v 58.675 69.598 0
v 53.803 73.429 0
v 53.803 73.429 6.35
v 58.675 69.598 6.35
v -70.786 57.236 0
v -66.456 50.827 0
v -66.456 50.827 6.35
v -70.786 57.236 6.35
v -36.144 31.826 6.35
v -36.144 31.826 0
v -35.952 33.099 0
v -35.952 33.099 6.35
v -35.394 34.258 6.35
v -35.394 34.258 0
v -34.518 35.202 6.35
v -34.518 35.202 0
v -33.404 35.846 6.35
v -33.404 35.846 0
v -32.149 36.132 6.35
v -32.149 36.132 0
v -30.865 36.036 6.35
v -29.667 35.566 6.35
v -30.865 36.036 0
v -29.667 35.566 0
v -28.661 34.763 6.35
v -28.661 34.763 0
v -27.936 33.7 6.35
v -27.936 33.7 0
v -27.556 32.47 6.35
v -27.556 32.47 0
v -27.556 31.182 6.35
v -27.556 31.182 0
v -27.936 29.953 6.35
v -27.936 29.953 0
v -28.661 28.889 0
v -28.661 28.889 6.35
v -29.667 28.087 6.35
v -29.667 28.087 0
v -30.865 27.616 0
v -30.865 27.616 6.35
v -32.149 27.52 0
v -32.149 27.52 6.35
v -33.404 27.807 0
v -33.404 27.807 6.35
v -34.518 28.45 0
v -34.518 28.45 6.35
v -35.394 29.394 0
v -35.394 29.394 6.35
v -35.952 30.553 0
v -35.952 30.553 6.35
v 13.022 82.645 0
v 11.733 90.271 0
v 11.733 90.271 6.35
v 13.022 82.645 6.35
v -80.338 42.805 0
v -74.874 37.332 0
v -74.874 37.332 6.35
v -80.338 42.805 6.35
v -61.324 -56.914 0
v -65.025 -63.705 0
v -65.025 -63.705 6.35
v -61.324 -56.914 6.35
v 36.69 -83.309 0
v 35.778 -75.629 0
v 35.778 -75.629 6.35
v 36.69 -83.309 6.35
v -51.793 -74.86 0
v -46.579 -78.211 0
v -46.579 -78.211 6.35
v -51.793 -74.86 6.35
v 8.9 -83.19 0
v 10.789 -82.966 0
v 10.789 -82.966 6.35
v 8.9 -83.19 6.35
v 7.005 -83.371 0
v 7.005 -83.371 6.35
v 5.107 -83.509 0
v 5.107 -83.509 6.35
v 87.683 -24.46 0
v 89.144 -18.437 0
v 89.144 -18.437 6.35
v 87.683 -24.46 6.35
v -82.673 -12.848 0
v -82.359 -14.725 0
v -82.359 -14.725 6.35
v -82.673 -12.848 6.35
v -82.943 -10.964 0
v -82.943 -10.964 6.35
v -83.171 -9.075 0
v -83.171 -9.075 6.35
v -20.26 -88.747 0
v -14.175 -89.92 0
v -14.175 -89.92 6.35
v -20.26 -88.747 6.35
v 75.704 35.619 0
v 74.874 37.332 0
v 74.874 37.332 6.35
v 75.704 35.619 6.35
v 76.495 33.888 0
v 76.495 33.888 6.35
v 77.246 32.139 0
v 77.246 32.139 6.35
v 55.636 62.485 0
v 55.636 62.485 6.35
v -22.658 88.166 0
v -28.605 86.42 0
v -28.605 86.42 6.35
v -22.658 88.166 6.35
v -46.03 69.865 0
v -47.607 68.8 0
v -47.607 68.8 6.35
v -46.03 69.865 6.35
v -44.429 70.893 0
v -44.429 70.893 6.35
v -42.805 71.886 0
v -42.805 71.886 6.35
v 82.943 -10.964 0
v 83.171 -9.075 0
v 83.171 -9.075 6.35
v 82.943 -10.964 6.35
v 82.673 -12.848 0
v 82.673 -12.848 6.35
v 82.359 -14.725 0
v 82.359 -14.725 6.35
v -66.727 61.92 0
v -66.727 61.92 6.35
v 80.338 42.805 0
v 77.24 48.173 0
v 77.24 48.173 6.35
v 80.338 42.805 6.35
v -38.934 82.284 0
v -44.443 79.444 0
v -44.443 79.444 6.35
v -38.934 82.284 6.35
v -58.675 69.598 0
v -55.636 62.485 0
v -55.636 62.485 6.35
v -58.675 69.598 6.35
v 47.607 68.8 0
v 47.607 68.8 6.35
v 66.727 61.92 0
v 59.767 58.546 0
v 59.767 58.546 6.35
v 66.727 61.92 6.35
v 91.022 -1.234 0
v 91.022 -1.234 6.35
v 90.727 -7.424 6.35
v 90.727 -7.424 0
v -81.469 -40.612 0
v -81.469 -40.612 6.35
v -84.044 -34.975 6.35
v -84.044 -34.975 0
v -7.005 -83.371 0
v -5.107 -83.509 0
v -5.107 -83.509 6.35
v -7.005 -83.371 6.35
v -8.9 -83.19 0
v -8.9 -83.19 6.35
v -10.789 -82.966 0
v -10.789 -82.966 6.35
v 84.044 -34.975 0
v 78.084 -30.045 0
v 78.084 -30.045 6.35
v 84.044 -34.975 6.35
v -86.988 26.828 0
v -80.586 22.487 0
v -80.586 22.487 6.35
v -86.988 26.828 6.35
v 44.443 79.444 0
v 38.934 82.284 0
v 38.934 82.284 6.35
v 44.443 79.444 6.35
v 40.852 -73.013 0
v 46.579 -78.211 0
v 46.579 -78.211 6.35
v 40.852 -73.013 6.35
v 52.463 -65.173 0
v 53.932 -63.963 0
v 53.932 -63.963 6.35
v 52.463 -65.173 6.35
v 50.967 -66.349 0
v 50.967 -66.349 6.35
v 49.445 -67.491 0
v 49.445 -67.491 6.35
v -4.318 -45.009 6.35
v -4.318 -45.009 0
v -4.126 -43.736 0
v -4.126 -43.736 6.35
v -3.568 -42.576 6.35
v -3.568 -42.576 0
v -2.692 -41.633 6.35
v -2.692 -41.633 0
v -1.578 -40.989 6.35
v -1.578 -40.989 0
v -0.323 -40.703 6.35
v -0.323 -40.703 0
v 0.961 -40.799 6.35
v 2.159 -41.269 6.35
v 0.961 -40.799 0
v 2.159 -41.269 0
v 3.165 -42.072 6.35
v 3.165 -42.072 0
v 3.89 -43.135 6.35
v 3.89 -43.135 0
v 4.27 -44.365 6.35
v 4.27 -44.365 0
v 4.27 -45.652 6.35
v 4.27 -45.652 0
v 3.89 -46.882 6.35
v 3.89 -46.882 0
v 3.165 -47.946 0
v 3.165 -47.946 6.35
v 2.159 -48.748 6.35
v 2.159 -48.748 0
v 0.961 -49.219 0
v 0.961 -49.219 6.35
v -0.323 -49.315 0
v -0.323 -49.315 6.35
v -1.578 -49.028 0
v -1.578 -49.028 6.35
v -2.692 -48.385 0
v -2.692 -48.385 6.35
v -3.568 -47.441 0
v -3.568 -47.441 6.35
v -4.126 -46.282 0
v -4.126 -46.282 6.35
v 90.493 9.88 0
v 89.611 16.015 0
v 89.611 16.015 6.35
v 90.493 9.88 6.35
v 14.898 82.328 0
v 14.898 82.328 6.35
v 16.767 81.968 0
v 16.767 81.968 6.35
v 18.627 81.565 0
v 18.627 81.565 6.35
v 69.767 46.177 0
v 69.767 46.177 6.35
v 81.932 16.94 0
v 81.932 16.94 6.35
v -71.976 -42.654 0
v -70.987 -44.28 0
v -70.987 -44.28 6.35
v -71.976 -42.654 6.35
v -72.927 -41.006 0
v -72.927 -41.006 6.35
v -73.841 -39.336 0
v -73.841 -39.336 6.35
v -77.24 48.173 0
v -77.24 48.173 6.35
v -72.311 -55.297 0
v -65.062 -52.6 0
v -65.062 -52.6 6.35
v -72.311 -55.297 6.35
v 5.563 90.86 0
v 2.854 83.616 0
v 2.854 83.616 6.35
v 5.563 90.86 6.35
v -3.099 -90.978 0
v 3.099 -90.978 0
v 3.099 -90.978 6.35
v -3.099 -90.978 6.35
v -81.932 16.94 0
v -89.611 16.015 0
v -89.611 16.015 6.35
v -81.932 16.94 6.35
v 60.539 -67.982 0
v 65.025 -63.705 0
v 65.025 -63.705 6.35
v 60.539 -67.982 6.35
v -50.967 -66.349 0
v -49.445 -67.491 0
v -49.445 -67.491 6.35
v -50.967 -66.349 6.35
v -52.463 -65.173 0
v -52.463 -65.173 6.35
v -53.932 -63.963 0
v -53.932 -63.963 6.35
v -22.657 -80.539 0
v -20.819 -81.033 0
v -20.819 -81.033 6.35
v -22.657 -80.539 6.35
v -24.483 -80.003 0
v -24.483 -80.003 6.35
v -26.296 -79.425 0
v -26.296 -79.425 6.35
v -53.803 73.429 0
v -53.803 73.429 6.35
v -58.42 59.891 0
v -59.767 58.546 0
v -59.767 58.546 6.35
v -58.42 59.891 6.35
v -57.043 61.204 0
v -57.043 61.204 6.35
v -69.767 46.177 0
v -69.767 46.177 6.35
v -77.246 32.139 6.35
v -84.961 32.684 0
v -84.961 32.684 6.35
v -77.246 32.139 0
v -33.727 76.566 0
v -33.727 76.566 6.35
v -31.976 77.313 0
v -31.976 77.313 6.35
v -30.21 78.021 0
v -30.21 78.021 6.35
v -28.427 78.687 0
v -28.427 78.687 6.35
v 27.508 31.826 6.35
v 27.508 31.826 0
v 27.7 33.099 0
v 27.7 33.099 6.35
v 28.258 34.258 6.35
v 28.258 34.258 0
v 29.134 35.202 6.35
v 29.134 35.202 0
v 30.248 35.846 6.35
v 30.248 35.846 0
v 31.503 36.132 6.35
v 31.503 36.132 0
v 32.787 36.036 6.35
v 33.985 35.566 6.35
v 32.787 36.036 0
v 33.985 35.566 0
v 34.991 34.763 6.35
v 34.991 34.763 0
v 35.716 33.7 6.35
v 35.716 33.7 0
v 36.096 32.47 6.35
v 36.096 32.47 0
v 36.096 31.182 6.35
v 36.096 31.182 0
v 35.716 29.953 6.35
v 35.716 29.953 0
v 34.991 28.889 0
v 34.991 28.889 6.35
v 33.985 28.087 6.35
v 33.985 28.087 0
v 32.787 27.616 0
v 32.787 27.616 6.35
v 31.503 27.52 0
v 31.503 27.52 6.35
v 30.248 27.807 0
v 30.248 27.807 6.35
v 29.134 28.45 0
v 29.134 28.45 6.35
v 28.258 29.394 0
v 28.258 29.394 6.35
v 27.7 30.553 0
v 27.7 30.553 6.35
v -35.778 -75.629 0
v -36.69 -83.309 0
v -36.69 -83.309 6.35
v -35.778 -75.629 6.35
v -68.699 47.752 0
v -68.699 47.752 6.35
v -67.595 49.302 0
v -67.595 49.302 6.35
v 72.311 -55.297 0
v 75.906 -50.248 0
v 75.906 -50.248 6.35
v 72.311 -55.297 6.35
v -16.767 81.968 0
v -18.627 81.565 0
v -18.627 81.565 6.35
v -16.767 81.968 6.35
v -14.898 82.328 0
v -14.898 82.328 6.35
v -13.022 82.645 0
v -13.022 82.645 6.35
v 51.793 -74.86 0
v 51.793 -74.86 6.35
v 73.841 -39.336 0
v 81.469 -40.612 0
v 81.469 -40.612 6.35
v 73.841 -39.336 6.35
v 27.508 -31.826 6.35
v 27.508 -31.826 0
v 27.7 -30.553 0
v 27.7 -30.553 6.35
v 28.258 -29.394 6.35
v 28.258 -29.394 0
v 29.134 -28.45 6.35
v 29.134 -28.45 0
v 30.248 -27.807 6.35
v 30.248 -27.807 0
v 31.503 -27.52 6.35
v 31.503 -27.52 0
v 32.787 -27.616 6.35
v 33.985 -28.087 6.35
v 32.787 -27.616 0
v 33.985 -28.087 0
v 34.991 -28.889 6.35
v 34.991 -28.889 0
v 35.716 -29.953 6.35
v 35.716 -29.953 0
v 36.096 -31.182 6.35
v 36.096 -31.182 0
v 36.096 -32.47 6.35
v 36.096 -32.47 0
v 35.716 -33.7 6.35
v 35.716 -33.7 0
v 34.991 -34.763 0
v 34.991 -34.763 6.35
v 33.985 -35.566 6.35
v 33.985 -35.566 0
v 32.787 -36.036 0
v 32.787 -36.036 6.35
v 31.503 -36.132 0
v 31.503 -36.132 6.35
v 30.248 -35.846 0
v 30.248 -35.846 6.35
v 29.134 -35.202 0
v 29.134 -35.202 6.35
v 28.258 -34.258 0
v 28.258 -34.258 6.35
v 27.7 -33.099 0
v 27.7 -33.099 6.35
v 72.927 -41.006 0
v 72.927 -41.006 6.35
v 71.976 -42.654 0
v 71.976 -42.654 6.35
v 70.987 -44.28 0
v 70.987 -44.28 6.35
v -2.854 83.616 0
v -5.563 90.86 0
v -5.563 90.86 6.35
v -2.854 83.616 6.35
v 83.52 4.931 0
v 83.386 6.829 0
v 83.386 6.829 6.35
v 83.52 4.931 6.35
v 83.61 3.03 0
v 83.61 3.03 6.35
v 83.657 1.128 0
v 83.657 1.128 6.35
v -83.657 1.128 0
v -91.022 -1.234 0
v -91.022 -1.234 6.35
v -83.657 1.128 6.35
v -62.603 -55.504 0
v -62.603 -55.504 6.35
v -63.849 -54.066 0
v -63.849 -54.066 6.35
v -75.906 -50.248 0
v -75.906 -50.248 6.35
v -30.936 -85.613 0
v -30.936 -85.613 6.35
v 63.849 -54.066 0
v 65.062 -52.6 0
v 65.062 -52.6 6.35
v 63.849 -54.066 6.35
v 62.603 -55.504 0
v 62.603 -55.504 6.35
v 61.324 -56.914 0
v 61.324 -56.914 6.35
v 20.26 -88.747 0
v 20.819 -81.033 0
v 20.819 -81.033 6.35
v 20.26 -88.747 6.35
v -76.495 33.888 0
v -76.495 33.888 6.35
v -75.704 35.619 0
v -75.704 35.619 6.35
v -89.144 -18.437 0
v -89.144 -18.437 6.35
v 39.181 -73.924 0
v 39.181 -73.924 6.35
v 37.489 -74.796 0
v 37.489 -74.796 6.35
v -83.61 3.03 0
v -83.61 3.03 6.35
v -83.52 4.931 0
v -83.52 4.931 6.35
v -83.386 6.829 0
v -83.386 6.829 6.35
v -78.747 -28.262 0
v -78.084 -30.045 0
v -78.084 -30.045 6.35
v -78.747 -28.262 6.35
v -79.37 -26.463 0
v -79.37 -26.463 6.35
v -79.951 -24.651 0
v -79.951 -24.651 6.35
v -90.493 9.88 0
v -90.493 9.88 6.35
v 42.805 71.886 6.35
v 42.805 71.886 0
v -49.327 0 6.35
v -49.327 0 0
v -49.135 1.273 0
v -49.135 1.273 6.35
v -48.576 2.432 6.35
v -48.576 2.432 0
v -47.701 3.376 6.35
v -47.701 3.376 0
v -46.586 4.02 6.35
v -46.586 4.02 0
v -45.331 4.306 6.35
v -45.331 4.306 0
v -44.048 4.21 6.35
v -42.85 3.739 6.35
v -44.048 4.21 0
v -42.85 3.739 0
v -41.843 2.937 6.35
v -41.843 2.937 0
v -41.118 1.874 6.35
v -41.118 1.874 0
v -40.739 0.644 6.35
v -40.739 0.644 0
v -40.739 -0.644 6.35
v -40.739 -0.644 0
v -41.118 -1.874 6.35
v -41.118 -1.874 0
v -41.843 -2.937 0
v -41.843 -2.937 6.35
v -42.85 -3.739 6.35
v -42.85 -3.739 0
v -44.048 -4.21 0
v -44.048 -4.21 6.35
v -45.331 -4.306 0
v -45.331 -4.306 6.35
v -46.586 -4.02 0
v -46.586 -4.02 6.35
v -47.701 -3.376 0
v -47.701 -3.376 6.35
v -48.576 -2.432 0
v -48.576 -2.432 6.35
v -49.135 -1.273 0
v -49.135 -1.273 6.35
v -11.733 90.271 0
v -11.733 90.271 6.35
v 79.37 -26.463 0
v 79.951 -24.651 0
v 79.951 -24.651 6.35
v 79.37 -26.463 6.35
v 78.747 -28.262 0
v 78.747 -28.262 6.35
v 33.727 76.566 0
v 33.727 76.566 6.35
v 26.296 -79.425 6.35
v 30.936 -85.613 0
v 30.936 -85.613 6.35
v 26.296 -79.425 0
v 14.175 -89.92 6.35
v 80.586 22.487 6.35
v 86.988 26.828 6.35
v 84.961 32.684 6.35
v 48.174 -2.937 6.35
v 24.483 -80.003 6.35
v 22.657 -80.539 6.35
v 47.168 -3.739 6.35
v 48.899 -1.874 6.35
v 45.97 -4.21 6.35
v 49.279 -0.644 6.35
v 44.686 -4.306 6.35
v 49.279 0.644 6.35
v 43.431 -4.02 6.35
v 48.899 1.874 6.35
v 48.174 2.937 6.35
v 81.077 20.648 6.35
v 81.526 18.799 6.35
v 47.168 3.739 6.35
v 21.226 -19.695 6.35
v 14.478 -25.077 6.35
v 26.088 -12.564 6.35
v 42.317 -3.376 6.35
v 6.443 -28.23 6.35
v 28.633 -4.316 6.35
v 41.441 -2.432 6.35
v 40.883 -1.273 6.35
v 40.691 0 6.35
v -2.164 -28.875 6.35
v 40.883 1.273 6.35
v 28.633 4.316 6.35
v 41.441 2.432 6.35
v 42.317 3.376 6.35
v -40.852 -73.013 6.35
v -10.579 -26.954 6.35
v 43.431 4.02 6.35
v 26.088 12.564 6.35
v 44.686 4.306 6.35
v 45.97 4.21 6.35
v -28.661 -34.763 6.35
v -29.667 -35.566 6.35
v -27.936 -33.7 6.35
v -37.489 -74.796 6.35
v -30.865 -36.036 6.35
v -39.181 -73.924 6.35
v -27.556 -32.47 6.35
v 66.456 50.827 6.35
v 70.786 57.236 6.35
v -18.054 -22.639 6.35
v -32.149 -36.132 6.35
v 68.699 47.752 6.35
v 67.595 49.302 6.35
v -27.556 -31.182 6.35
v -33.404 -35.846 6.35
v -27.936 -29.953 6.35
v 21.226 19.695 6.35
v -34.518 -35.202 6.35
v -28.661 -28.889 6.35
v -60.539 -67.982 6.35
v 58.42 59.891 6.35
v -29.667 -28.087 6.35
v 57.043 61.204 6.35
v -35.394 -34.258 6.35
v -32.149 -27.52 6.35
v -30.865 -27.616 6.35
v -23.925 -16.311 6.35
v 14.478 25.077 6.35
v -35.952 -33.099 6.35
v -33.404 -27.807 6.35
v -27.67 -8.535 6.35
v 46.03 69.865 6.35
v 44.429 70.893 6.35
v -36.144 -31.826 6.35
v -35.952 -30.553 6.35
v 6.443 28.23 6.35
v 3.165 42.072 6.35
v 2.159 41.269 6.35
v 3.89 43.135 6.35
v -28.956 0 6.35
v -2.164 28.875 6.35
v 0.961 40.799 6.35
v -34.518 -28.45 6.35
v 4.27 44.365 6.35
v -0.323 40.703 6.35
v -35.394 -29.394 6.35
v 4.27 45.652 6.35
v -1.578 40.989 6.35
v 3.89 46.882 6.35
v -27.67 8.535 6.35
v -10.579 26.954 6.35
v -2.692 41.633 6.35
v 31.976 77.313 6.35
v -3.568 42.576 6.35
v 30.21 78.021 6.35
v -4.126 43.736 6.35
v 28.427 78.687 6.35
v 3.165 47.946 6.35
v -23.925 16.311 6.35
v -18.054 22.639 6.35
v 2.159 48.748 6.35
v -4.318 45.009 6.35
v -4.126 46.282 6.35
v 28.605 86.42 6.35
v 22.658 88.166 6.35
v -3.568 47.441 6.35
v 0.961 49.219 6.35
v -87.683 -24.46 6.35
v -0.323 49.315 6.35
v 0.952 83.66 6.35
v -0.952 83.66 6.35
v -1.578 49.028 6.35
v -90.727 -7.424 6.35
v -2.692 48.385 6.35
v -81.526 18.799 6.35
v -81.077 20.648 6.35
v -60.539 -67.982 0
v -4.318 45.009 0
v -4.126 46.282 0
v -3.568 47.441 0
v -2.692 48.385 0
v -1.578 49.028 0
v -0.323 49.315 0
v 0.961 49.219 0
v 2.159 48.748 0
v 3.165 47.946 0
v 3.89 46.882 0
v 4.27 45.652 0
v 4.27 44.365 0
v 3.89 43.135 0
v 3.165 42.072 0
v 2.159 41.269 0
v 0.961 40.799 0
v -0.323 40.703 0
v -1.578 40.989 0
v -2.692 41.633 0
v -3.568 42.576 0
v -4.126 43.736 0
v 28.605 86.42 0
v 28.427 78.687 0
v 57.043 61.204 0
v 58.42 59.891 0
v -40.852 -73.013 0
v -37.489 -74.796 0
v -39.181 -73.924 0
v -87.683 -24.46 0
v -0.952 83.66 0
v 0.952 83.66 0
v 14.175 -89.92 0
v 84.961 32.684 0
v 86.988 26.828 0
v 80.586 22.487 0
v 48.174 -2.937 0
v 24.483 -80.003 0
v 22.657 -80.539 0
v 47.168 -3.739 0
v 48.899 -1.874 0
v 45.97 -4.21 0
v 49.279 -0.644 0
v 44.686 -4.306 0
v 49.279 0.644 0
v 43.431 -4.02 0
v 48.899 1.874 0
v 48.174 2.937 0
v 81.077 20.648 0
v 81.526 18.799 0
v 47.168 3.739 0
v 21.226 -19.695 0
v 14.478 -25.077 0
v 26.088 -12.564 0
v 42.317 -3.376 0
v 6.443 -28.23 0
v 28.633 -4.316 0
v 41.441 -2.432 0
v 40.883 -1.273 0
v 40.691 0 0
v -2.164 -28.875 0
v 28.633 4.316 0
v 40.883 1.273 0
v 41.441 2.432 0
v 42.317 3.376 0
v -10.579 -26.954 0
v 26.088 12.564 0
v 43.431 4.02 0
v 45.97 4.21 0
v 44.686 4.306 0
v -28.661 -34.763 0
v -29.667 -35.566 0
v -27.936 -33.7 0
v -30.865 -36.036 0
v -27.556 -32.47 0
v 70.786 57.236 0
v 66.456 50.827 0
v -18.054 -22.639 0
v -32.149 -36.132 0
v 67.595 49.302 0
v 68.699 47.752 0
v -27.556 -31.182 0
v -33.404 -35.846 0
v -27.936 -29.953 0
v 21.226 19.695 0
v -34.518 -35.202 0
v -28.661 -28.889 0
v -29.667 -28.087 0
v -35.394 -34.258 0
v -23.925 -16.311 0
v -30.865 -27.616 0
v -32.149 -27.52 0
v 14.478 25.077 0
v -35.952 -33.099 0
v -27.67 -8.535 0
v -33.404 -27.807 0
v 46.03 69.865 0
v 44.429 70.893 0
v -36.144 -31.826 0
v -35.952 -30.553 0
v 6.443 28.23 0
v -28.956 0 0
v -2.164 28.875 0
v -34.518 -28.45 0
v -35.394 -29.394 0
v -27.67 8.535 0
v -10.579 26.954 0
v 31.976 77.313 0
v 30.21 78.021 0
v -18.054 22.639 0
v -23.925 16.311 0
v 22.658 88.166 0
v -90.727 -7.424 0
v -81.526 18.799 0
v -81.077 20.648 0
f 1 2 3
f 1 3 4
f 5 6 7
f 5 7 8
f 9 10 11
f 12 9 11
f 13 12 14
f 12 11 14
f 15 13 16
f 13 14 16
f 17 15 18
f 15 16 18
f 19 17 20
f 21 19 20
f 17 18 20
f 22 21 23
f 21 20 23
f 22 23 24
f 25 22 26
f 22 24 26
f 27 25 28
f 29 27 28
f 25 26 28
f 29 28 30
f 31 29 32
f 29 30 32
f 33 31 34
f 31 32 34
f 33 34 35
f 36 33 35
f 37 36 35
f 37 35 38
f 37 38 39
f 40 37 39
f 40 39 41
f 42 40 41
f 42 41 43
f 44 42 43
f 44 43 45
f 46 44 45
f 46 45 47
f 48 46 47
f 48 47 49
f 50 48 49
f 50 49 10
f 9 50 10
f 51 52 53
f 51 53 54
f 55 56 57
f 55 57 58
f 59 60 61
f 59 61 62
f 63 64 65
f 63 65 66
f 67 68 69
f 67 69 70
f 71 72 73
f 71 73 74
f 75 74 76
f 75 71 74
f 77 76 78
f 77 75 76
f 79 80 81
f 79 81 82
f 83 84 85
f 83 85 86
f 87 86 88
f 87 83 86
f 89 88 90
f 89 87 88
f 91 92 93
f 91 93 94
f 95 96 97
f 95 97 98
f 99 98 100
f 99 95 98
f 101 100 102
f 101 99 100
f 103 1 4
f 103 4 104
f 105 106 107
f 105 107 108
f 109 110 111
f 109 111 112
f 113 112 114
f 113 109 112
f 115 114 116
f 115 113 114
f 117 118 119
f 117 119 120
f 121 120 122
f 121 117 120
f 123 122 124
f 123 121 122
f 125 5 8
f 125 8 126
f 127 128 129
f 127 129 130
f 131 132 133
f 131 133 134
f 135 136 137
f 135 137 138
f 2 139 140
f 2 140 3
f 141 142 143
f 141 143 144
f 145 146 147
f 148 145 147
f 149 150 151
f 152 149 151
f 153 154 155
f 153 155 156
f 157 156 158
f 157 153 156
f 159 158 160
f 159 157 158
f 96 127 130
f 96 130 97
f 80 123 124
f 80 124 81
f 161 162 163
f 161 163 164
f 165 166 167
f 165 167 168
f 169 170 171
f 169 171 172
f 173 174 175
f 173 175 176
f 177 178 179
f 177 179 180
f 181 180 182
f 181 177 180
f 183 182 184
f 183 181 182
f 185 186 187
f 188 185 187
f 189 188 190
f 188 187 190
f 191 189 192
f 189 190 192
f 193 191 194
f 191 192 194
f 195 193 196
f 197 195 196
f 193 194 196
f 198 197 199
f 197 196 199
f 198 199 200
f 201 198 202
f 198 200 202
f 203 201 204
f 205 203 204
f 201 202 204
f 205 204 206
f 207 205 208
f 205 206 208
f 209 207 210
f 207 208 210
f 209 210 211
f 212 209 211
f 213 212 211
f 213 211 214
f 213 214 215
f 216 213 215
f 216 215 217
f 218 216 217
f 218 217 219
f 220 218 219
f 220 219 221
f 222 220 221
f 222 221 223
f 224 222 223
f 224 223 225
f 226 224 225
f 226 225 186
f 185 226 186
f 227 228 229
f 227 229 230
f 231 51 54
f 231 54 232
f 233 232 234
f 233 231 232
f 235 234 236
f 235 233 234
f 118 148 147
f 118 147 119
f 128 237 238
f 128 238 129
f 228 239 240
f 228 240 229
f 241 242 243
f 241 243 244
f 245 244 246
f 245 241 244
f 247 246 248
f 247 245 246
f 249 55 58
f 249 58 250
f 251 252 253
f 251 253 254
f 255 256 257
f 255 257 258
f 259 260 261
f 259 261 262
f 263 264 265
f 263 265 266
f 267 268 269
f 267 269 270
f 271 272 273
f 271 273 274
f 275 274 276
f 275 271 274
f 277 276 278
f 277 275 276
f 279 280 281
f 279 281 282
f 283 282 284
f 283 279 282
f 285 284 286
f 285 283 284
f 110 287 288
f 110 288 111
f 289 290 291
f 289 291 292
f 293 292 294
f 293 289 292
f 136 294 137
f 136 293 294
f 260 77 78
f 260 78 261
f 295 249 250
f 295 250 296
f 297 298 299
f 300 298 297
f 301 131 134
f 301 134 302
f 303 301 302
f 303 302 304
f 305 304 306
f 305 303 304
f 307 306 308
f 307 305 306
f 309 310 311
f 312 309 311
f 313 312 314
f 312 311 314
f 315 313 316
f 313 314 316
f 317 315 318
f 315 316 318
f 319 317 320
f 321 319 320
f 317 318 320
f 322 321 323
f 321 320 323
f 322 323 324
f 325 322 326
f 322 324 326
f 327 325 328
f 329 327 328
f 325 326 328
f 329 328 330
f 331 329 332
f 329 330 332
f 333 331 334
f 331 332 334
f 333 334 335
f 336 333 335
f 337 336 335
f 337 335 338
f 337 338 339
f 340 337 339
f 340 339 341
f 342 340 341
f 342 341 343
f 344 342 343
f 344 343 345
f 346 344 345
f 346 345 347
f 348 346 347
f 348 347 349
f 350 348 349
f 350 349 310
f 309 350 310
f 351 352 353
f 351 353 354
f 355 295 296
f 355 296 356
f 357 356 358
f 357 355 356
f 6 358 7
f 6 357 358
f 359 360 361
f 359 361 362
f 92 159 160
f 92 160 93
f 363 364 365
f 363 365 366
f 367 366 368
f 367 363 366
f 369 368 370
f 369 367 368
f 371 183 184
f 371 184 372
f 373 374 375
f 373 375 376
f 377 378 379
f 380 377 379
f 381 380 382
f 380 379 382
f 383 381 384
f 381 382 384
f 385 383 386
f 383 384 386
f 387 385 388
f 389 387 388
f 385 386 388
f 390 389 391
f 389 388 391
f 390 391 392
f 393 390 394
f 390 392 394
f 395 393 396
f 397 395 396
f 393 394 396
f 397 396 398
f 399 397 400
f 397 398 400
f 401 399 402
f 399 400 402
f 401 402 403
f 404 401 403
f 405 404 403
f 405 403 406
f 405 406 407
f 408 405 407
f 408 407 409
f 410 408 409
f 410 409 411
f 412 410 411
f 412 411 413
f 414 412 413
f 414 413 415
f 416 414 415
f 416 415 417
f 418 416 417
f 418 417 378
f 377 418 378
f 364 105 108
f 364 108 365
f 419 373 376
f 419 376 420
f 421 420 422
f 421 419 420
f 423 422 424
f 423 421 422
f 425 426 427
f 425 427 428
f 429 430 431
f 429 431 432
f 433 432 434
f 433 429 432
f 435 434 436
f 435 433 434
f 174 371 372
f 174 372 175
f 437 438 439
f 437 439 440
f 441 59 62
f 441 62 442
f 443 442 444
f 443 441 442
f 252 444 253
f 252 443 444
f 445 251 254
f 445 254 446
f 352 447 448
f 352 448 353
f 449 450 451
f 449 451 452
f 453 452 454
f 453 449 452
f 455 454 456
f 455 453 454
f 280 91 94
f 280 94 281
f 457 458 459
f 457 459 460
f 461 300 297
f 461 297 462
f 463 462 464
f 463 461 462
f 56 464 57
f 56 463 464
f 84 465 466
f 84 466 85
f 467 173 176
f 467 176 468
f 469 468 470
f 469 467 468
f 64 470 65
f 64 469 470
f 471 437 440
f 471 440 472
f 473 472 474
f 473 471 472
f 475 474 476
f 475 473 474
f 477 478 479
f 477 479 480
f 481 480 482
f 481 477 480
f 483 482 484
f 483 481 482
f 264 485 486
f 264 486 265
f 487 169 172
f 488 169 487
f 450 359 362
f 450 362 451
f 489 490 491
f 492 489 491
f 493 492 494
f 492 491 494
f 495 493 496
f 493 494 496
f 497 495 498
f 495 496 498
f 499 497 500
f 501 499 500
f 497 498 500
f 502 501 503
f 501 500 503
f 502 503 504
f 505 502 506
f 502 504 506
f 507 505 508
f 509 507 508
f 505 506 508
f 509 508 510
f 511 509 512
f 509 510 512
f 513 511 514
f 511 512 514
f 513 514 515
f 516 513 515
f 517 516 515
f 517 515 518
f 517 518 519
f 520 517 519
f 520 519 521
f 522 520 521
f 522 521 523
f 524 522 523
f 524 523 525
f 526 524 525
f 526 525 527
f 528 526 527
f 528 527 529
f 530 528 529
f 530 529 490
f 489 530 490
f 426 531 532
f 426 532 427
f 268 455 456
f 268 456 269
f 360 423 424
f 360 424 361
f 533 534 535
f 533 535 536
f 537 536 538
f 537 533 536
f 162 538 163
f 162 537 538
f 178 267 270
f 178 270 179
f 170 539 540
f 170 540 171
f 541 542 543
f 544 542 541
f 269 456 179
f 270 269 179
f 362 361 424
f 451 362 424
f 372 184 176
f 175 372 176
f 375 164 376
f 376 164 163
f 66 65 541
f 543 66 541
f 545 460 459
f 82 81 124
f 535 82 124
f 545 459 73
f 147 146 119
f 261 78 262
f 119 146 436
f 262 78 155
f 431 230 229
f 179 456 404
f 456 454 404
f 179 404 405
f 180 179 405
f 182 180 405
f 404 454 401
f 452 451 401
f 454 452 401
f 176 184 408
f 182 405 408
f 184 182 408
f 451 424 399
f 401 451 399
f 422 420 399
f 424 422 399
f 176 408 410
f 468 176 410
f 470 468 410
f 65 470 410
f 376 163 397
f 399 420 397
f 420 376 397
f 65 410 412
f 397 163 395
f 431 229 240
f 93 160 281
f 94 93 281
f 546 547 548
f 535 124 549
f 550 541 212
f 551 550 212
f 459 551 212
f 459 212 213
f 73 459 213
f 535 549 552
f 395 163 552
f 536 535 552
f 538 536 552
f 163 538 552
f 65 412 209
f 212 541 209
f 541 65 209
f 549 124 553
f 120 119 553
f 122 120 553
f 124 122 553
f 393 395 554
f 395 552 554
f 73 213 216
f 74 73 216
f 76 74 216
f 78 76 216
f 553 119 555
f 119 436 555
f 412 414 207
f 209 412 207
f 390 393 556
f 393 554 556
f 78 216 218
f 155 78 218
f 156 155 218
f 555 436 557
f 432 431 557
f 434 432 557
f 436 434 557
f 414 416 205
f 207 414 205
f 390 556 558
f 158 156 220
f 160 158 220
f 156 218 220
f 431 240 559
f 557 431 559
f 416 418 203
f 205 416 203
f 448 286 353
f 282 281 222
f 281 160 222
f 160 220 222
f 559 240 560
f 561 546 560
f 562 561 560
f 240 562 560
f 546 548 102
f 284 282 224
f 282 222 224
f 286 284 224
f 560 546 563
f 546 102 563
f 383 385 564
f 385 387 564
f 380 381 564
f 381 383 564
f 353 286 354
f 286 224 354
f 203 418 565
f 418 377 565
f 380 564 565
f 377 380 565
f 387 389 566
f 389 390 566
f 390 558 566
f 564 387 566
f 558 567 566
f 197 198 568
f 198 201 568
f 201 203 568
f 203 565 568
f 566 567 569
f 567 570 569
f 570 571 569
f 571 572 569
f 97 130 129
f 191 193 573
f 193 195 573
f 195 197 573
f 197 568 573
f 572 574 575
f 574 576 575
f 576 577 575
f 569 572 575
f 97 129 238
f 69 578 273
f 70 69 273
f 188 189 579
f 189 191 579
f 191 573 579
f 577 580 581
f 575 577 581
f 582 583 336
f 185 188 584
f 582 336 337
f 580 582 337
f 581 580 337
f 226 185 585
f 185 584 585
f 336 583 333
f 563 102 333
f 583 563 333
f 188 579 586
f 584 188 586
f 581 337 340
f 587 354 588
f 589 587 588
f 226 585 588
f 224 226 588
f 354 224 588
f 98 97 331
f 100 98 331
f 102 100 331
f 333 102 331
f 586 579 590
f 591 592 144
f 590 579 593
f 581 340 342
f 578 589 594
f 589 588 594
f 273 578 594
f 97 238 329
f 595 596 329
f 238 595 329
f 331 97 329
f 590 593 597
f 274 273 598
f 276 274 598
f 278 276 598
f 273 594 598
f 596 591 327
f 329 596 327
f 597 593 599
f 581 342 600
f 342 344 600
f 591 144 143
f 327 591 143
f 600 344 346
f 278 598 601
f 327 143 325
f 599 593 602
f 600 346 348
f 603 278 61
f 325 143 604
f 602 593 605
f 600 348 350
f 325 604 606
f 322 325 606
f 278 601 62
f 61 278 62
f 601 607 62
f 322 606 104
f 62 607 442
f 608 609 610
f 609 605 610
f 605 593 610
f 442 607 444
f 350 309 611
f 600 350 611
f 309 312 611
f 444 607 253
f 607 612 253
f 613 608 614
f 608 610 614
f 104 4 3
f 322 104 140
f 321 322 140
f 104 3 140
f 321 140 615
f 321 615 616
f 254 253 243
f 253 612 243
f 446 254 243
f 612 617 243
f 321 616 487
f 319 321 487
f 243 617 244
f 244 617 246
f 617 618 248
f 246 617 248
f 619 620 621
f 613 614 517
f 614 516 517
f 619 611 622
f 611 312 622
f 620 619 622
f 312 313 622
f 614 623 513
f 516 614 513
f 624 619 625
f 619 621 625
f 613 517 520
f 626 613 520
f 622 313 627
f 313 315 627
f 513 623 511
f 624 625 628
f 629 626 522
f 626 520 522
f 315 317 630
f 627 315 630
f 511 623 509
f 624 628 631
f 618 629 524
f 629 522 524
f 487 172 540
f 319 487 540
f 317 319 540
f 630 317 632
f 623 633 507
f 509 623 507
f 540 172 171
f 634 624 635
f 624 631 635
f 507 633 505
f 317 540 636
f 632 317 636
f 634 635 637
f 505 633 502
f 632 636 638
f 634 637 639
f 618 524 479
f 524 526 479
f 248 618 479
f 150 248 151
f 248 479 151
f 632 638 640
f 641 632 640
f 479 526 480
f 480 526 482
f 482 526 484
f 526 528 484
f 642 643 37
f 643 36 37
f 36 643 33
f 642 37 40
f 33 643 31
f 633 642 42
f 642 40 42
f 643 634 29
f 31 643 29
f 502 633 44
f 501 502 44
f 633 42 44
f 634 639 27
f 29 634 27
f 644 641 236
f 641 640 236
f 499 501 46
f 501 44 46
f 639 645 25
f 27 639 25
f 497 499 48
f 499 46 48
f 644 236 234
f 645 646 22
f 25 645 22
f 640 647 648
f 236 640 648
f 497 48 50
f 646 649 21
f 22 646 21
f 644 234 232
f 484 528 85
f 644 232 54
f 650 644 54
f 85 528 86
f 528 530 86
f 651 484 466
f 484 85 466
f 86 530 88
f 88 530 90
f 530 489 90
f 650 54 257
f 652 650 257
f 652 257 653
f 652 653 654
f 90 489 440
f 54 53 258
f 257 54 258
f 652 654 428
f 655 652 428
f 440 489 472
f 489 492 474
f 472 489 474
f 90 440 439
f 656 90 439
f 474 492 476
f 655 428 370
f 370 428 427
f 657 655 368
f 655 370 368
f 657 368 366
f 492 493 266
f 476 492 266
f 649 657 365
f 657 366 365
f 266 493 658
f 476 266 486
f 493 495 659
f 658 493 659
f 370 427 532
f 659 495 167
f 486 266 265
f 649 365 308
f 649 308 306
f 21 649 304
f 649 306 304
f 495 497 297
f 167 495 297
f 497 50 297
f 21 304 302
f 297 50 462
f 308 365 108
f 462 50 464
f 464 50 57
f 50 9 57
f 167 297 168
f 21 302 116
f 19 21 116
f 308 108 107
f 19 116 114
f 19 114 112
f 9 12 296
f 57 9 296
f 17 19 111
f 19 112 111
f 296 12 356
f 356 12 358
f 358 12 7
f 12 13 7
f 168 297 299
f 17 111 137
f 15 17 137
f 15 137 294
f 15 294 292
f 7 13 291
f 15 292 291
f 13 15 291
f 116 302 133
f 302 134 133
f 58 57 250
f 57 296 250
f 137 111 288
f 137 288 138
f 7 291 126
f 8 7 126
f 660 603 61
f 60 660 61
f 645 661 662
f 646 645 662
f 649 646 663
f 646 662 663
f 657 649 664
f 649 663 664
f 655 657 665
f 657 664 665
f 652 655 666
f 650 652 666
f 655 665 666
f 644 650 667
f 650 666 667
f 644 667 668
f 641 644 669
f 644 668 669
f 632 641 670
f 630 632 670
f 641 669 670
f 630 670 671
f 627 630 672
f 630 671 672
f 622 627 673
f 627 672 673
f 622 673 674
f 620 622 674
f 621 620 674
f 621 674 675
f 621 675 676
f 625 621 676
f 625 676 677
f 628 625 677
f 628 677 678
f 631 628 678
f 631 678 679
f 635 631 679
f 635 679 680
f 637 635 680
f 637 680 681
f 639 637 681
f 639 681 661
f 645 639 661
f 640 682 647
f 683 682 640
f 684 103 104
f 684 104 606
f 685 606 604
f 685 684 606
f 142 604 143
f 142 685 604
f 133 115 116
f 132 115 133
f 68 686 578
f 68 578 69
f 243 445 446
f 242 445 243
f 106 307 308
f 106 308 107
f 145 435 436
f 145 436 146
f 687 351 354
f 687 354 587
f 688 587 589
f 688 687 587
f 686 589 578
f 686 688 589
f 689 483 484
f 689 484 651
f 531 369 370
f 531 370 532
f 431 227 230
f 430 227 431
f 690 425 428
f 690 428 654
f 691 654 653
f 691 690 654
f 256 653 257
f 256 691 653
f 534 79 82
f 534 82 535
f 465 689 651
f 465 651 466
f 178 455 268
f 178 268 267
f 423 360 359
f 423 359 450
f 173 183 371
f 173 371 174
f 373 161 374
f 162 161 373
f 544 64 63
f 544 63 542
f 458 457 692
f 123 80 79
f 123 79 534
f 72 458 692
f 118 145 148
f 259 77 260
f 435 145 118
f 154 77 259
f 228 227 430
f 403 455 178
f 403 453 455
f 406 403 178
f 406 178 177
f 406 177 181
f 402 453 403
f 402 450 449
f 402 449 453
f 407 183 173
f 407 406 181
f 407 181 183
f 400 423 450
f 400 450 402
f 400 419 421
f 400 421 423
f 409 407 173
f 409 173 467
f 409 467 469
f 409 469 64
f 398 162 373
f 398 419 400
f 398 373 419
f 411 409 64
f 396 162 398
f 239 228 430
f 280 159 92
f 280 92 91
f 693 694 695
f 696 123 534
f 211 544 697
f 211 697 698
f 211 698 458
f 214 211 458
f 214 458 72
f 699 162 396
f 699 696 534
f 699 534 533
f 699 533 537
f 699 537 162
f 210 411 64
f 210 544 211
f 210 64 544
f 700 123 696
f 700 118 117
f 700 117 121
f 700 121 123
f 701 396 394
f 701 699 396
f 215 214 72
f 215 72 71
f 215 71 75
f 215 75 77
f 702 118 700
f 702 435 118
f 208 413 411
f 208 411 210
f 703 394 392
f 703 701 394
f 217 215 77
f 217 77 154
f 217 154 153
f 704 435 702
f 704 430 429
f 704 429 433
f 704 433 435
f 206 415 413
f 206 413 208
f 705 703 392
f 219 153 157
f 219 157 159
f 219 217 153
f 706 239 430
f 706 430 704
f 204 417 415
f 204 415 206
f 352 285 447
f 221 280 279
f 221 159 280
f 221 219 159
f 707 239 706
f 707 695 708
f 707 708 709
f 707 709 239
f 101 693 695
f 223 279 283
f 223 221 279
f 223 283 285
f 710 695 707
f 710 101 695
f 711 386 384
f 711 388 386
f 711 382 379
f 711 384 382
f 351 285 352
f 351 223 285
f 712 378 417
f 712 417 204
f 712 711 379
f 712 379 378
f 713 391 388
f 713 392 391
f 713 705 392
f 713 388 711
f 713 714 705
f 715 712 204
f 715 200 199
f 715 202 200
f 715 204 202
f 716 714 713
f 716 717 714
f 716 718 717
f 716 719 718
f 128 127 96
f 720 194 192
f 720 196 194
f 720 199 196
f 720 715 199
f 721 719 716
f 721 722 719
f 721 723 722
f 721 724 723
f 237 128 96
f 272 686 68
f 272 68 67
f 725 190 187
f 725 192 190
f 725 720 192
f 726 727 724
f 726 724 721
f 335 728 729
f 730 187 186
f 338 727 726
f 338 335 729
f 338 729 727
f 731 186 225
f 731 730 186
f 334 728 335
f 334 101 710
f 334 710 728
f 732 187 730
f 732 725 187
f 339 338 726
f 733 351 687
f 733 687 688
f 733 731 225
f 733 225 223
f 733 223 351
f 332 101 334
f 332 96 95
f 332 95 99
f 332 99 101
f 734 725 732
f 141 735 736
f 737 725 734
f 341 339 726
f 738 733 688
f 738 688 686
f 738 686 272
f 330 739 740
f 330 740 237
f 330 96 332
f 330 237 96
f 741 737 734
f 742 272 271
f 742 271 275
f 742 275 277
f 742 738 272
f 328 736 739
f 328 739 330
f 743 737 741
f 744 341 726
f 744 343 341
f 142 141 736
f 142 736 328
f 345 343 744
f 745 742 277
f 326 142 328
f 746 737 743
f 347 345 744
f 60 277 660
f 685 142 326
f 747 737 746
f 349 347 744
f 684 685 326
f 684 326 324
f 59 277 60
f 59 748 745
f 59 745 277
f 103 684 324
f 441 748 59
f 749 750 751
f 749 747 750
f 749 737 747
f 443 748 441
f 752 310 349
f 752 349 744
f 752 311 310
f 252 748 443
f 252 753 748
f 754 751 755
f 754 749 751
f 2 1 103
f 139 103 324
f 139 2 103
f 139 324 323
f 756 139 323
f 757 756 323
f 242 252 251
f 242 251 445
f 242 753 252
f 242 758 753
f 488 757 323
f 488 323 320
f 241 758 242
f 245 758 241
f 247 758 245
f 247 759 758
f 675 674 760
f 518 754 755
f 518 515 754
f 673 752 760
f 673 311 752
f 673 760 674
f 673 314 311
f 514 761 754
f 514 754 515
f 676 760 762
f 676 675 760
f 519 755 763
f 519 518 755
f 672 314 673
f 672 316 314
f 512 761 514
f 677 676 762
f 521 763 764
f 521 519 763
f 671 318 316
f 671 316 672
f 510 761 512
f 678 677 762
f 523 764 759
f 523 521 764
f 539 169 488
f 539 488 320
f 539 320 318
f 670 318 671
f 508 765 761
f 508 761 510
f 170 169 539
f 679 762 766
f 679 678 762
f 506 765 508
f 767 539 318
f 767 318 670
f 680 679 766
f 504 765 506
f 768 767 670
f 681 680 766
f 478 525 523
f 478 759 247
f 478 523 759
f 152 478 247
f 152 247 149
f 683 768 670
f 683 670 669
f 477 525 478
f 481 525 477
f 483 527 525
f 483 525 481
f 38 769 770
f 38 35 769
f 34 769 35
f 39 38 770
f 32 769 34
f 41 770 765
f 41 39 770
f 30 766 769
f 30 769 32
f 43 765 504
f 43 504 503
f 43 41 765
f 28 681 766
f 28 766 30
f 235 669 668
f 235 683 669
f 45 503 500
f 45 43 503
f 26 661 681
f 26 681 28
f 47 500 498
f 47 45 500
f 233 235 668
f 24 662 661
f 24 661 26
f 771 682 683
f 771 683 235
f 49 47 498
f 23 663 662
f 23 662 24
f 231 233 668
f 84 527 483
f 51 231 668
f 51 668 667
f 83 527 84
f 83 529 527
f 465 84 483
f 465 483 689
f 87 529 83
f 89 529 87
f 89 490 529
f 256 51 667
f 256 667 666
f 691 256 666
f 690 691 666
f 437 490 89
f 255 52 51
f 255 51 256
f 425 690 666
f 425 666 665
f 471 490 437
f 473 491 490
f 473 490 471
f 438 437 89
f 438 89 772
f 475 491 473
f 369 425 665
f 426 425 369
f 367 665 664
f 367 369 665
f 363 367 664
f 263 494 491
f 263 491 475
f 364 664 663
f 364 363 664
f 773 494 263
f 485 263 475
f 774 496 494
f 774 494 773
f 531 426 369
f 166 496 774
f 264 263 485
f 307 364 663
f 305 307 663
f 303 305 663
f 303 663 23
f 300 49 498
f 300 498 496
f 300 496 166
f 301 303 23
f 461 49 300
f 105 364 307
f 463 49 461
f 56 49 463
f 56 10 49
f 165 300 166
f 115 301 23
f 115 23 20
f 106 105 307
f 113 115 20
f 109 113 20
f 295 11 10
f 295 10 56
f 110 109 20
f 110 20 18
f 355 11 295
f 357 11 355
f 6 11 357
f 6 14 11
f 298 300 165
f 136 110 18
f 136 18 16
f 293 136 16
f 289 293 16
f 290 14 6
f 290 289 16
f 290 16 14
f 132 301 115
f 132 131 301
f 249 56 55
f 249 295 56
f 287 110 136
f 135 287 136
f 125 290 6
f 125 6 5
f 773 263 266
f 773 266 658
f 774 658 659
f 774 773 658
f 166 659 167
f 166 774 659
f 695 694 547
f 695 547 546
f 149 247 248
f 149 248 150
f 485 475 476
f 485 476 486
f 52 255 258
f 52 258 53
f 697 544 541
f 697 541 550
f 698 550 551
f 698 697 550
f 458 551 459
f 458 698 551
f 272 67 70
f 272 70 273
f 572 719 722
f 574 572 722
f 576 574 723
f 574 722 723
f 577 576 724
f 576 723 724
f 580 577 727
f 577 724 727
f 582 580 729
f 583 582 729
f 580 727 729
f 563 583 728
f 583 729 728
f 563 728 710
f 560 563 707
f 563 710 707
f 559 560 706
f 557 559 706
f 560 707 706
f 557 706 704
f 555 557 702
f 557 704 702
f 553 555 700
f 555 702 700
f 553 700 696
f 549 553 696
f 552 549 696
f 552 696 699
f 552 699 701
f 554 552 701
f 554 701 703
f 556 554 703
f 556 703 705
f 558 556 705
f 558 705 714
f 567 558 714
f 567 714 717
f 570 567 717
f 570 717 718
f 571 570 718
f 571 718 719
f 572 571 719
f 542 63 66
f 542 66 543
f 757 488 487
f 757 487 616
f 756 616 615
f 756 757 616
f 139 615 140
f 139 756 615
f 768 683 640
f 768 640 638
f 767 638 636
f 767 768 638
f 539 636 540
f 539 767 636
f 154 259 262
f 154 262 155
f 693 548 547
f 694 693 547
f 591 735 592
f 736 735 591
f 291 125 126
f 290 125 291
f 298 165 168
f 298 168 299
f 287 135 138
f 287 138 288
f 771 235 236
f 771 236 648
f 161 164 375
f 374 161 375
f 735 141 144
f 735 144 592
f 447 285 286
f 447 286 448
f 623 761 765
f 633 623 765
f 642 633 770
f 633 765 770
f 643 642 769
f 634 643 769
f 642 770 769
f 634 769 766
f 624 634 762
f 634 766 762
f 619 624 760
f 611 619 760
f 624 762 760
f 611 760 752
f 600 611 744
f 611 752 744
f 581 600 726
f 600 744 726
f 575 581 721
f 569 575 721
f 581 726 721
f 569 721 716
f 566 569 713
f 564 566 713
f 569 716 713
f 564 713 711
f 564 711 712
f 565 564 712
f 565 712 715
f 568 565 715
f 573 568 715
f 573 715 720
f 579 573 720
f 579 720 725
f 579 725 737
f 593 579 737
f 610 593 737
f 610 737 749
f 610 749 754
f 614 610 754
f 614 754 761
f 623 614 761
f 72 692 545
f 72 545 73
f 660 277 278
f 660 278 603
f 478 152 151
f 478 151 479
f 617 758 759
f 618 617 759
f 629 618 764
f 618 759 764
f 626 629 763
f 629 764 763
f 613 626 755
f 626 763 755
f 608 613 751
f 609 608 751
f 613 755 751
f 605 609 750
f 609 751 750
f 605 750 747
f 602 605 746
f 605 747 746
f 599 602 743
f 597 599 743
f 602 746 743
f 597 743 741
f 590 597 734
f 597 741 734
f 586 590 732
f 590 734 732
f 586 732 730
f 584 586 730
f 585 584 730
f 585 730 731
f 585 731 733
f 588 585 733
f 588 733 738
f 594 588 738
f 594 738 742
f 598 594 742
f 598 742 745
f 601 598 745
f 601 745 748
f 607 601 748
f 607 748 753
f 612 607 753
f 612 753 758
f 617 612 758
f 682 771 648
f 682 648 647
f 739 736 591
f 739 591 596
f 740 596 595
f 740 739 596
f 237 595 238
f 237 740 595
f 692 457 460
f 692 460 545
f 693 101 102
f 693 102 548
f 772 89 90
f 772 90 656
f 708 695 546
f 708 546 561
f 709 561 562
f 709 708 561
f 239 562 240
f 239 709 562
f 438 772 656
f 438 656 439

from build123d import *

# Parameters (mm, degrees)
BOSS_EXTRUDE1_DEPTH = 6.35
SKETCH2_R           = 28.956
SKETCH2_R_2         = 4.318
CUT_EXTRUDE1_DEPTH  = 129.84998677


with BuildPart() as part:
    # Sketch1 → Boss-Extrude1 (new body)
    with BuildSketch(Plane.XY):
        with BuildLine():
            Line((2.85403164, 83.616306594), (5.563187423, 90.860395533))
            Line((5.563187423, 90.860395533), (11.732789539, 90.271269961))
            Line((11.732789539, 90.271269961), (13.022034501, 82.645380043))
            ThreePointArc((13.022034501, 82.645380043), (15.833705359, 82.153064456), (18.626945642, 81.565121964))
            Line((18.626945642, 81.565121964), (22.658096297, 88.165589676))
            Line((22.658096297, 88.165589676), (28.604712917, 86.419505493))
            Line((28.604712917, 86.419505493), (28.427450387, 78.687434127))
            ThreePointArc((28.427450387, 78.687434127), (31.095139353, 77.671903116), (33.726633297, 76.565961311))
            Line((33.726633297, 76.565961311), (38.934082535, 82.284249695))
            Line((38.934082535, 82.284249695), (44.442787442, 79.444314933))
            Line((44.442787442, 79.444314933), (42.805424149, 71.885519323))
            ThreePointArc((42.805424149, 71.885519323), (45.232713992, 70.383476824), (47.60735255, 68.799507325))
            Line((47.60735255, 68.799507325), (53.802889589, 73.42894254))
            Line((53.802889589, 73.42894254), (58.674583834, 69.597799841))
            Line((58.674583834, 69.597799841), (55.636298354, 62.485474556))
            ThreePointArc((55.636298354, 62.485474556), (57.735460496, 60.551208298), (59.767418042, 58.546459889))
            Line((59.767418042, 58.546459889), (66.727120031, 61.919722085))
            Line((66.727120031, 61.919722085), (70.785727891, 57.235838927))
            Line((70.785727891, 57.235838927), (66.456331777, 50.827041933))
            ThreePointArc((66.456331777, 50.827041933), (68.151497028, 48.530461339), (69.767333324, 46.177390852))
            Line((69.767333324, 46.177390852), (77.239658499, 48.172561544))
            Line((77.239658499, 48.172561544), (80.338491312, 42.805225668))
            Line((80.338491312, 42.805225668), (74.87446022, 37.331587587))
            ThreePointArc((74.87446022, 37.331587587), (76.104360891, 34.755697063), (77.245675402, 32.139350595))
            Line((77.245675402, 32.139350595), (84.960554463, 32.684319115))
            Line((84.960554463, 32.684319115), (86.987612337, 26.827520026))
            Line((86.987612337, 26.827520026), (80.586430587, 22.486872398))
            ThreePointArc((80.586430587, 22.486872398), (81.306614864, 19.724771339), (81.93215751, 16.939710469))
            Line((81.93215751, 16.939710469), (89.610754626, 16.014780236))
            Line((89.610754626, 16.014780236), (90.492774408, 9.880197911))
            Line((90.492774408, 9.880197911), (83.385797386, 6.829423052))
            ThreePointArc((83.385797386, 6.829423052), (83.570235933, 3.980940987), (83.657397973, 1.127825071))
            Line((83.657397973, 1.127825071), (91.022188639, -1.233574527))
            Line((91.022188639, -1.233574527), (90.727291835, -7.424220299))
            Line((90.727291835, -7.424220299), (83.171384209, -9.074859436))
            ThreePointArc((83.171384209, -9.074859436), (82.813410935, -11.906770944), (82.359042106, -14.724822863))
            Line((82.359042106, -14.724822863), (89.143843598, -18.437344692))
            Line((89.143843598, -18.437344692), (87.682688548, -24.460307843))
            Line((87.682688548, -24.460307843), (79.950940505, -24.651152861))
            ThreePointArc((79.950940505, -24.651152861), (79.063493498, -27.364141151), (78.084015873, -30.045277335))
            Line((78.084015873, -30.045277335), (84.043607787, -34.974741183))
            Line((84.043607787, -34.974741183), (81.469004441, -40.612336132))
            Line((81.469004441, -40.612336132), (73.840861501, -39.336489393))
            ThreePointArc((73.840861501, -39.336489393), (72.456015408, -41.8325), (70.986829861, -44.279817201))
            Line((70.986829861, -44.279817201), (75.905817018, -50.248059401))
            Line((75.905817018, -50.248059401), (72.310818249, -55.296528778))
            Line((72.310818249, -55.296528778), (65.061981372, -52.600102708))
            ThreePointArc((65.061981372, -52.600102708), (63.229788138, -54.788923305), (61.323994863, -56.913969103))
            Line((61.323994863, -56.913969103), (65.024592251, -63.705281833))
            Line((65.024592251, -63.705281833), (60.539130681, -67.982160801))
            Line((60.539130681, -67.982160801), (53.931591719, -63.962611264))
            ThreePointArc((53.931591719, -63.962611264), (51.718271582, -65.765132172), (49.444750912, -67.491101874))
            Line((49.444750912, -67.491101874), (51.7932093, -74.860029396))
            Line((51.7932093, -74.860029396), (46.579401197, -78.210740406))
            Line((46.579401197, -78.210740406), (40.851973824, -73.013344395))
            ThreePointArc((40.851973824, -73.013344395), (38.33752194, -74.364417812), (35.778444837, -75.628930378))
            Line((35.778444837, -75.628930378), (36.689884819, -83.309140451))
            Line((36.689884819, -83.309140451), (30.936170793, -85.612580077))
            Line((30.936170793, -85.612580077), (26.295859156, -79.425185025))
            ThreePointArc((26.295859156, -79.425185025), (23.571154368, -80.275979637), (20.819012545, -81.033332288))
            Line((20.819012545, -81.033332288), (20.260492306, -88.747242111))
            Line((20.260492306, -88.747242111), (14.174826572, -89.920158042))
            Line((14.174826572, -89.920158042), (10.789343625, -82.966392528))
            ThreePointArc((10.789343625, -82.966392528), (7.952863863, -83.286158402), (5.107126896, -83.508978439))
            Line((5.107126896, -83.508978439), (3.098832813, -90.977787212))
            Line((3.098832813, -90.977787212), (-3.098832812, -90.977787212))
            Line((-3.098832812, -90.977787212), (-5.107126896, -83.508978439))
            ThreePointArc((-5.107126896, -83.508978439), (-7.952863863, -83.286158402), (-10.789343625, -82.966392528))
            Line((-10.789343625, -82.966392528), (-14.174826572, -89.920158042))
            Line((-14.174826572, -89.920158042), (-20.260492306, -88.747242111))
            Line((-20.260492306, -88.747242111), (-20.819012545, -81.033332288))
            ThreePointArc((-20.819012545, -81.033332288), (-23.571154368, -80.275979637), (-26.295859156, -79.425185025))
            Line((-26.295859156, -79.425185025), (-30.936170793, -85.612580077))
            Line((-30.936170793, -85.612580077), (-36.689884818, -83.309140451))
            Line((-36.689884818, -83.309140451), (-35.778444837, -75.628930378))
            ThreePointArc((-35.778444837, -75.628930378), (-38.33752194, -74.364417812), (-40.851973824, -73.013344395))
            Line((-40.851973824, -73.013344395), (-46.579401197, -78.210740406))
            Line((-46.579401197, -78.210740406), (-51.7932093, -74.860029396))
            Line((-51.7932093, -74.860029396), (-49.444750912, -67.491101875))
            ThreePointArc((-49.444750912, -67.491101875), (-51.718271582, -65.765132172), (-53.931591719, -63.962611264))
            Line((-53.931591719, -63.962611264), (-60.539130681, -67.982160801))
            Line((-60.539130681, -67.982160801), (-65.024592251, -63.705281833))
            Line((-65.024592251, -63.705281833), (-61.323994863, -56.913969103))
            ThreePointArc((-61.323994863, -56.913969103), (-63.229788138, -54.788923306), (-65.061981372, -52.600102708))
            Line((-65.061981372, -52.600102708), (-72.310818249, -55.296528778))
            Line((-72.310818249, -55.296528778), (-75.905817018, -50.248059401))
            Line((-75.905817018, -50.248059401), (-70.986829861, -44.279817201))
            ThreePointArc((-70.986829861, -44.279817201), (-72.456015408, -41.8325), (-73.840861501, -39.336489393))
            Line((-73.840861501, -39.336489393), (-81.469004441, -40.612336132))
            Line((-81.469004441, -40.612336132), (-84.043607787, -34.974741183))
            Line((-84.043607787, -34.974741183), (-78.084015873, -30.045277335))
            ThreePointArc((-78.084015873, -30.045277335), (-79.063493498, -27.364141151), (-79.950940505, -24.651152861))
            Line((-79.950940505, -24.651152861), (-87.682688547, -24.460307844))
            Line((-87.682688547, -24.460307844), (-89.143843598, -18.437344693))
            Line((-89.143843598, -18.437344693), (-82.359042106, -14.724822863))
            ThreePointArc((-82.359042106, -14.724822863), (-82.813410935, -11.906770944), (-83.171384209, -9.074859436))
            Line((-83.171384209, -9.074859436), (-90.727291835, -7.424220299))
            Line((-90.727291835, -7.424220299), (-91.022188639, -1.233574527))
            Line((-91.022188639, -1.233574527), (-83.657397973, 1.127825071))
            ThreePointArc((-83.657397973, 1.127825071), (-83.570235933, 3.980940987), (-83.385797386, 6.829423052))
            Line((-83.385797386, 6.829423052), (-90.492774407, 9.880197911))
            Line((-90.492774407, 9.880197911), (-89.610754626, 16.014780236))
            Line((-89.610754626, 16.014780236), (-81.93215751, 16.939710469))
            ThreePointArc((-81.93215751, 16.939710469), (-81.306614864, 19.724771339), (-80.586430587, 22.486872398))
            Line((-80.586430587, 22.486872398), (-86.987612336, 26.827520026))
            Line((-86.987612336, 26.827520026), (-84.960554463, 32.684319115))
            Line((-84.960554463, 32.684319115), (-77.245675402, 32.139350595))
            ThreePointArc((-77.245675402, 32.139350595), (-76.104360891, 34.755697063), (-74.87446022, 37.331587587))
            Line((-74.87446022, 37.331587587), (-80.338491312, 42.805225668))
            Line((-80.338491312, 42.805225668), (-77.239658499, 48.172561544))
            Line((-77.239658499, 48.172561544), (-69.767333324, 46.177390852))
            ThreePointArc((-69.767333324, 46.177390852), (-68.151497028, 48.530461339), (-66.456331777, 50.827041933))
            Line((-66.456331777, 50.827041933), (-70.785727891, 57.235838927))
            Line((-70.785727891, 57.235838927), (-66.727120031, 61.919722085))
            Line((-66.727120031, 61.919722085), (-59.767418042, 58.546459889))
            ThreePointArc((-59.767418042, 58.546459889), (-57.735460496, 60.551208298), (-55.636298354, 62.485474556))
            Line((-55.636298354, 62.485474556), (-58.674583834, 69.597799841))
            Line((-58.674583834, 69.597799841), (-53.802889589, 73.42894254))
            Line((-53.802889589, 73.42894254), (-47.60735255, 68.799507325))
            ThreePointArc((-47.60735255, 68.799507325), (-45.232713992, 70.383476824), (-42.805424149, 71.885519323))
            Line((-42.805424149, 71.885519323), (-44.442787442, 79.444314933))
            Line((-44.442787442, 79.444314933), (-38.934082535, 82.284249695))
            Line((-38.934082535, 82.284249695), (-33.726633297, 76.565961311))
            ThreePointArc((-33.726633297, 76.565961311), (-31.095139353, 77.671903116), (-28.427450387, 78.687434127))
            Line((-28.427450387, 78.687434127), (-28.604712917, 86.419505493))
            Line((-28.604712917, 86.419505493), (-22.658096297, 88.165589676))
            Line((-22.658096297, 88.165589676), (-18.626945642, 81.565121964))
            ThreePointArc((-18.626945642, 81.565121964), (-15.833705359, 82.153064456), (-13.022034501, 82.645380043))
            Line((-13.022034501, 82.645380043), (-11.732789539, 90.271269961))
            Line((-11.732789539, 90.271269961), (-5.563187423, 90.860395533))
            Line((-5.563187423, 90.860395533), (-2.85403164, 83.616306594))
            ThreePointArc((-2.85403164, 83.616306594), (0, 83.665), (2.85403164, 83.616306594))
        make_face()
    extrude(amount=BOSS_EXTRUDE1_DEPTH)

    # Sketch2 → Cut-Extrude1 (cut, through all)
    with BuildSketch(Plane(origin=(0, 0, 0), x_dir=(-1, 0, 0), z_dir=(0, 0, -1))):
        Circle(SKETCH2_R)
        with Locations((0, 45.0088)):
            Circle(SKETCH2_R_2)
        with Locations((31.826027693, 31.826027693)):
            Circle(SKETCH2_R_2)
        with Locations((45.0088, 0)):
            Circle(SKETCH2_R_2)
        with Locations((31.826027693, -31.826027693)):
            Circle(SKETCH2_R_2)
        with Locations((0, -45.0088)):
            Circle(SKETCH2_R_2)
        with Locations((-31.826027693, -31.826027693)):
            Circle(SKETCH2_R_2)
        with Locations((-45.0088, 0)):
            Circle(SKETCH2_R_2)
        with Locations((-31.826027693, 31.826027693)):
            Circle(SKETCH2_R_2)
    extrude(amount=-CUT_EXTRUDE1_DEPTH, mode=Mode.SUBTRACT)


solid = part.part
